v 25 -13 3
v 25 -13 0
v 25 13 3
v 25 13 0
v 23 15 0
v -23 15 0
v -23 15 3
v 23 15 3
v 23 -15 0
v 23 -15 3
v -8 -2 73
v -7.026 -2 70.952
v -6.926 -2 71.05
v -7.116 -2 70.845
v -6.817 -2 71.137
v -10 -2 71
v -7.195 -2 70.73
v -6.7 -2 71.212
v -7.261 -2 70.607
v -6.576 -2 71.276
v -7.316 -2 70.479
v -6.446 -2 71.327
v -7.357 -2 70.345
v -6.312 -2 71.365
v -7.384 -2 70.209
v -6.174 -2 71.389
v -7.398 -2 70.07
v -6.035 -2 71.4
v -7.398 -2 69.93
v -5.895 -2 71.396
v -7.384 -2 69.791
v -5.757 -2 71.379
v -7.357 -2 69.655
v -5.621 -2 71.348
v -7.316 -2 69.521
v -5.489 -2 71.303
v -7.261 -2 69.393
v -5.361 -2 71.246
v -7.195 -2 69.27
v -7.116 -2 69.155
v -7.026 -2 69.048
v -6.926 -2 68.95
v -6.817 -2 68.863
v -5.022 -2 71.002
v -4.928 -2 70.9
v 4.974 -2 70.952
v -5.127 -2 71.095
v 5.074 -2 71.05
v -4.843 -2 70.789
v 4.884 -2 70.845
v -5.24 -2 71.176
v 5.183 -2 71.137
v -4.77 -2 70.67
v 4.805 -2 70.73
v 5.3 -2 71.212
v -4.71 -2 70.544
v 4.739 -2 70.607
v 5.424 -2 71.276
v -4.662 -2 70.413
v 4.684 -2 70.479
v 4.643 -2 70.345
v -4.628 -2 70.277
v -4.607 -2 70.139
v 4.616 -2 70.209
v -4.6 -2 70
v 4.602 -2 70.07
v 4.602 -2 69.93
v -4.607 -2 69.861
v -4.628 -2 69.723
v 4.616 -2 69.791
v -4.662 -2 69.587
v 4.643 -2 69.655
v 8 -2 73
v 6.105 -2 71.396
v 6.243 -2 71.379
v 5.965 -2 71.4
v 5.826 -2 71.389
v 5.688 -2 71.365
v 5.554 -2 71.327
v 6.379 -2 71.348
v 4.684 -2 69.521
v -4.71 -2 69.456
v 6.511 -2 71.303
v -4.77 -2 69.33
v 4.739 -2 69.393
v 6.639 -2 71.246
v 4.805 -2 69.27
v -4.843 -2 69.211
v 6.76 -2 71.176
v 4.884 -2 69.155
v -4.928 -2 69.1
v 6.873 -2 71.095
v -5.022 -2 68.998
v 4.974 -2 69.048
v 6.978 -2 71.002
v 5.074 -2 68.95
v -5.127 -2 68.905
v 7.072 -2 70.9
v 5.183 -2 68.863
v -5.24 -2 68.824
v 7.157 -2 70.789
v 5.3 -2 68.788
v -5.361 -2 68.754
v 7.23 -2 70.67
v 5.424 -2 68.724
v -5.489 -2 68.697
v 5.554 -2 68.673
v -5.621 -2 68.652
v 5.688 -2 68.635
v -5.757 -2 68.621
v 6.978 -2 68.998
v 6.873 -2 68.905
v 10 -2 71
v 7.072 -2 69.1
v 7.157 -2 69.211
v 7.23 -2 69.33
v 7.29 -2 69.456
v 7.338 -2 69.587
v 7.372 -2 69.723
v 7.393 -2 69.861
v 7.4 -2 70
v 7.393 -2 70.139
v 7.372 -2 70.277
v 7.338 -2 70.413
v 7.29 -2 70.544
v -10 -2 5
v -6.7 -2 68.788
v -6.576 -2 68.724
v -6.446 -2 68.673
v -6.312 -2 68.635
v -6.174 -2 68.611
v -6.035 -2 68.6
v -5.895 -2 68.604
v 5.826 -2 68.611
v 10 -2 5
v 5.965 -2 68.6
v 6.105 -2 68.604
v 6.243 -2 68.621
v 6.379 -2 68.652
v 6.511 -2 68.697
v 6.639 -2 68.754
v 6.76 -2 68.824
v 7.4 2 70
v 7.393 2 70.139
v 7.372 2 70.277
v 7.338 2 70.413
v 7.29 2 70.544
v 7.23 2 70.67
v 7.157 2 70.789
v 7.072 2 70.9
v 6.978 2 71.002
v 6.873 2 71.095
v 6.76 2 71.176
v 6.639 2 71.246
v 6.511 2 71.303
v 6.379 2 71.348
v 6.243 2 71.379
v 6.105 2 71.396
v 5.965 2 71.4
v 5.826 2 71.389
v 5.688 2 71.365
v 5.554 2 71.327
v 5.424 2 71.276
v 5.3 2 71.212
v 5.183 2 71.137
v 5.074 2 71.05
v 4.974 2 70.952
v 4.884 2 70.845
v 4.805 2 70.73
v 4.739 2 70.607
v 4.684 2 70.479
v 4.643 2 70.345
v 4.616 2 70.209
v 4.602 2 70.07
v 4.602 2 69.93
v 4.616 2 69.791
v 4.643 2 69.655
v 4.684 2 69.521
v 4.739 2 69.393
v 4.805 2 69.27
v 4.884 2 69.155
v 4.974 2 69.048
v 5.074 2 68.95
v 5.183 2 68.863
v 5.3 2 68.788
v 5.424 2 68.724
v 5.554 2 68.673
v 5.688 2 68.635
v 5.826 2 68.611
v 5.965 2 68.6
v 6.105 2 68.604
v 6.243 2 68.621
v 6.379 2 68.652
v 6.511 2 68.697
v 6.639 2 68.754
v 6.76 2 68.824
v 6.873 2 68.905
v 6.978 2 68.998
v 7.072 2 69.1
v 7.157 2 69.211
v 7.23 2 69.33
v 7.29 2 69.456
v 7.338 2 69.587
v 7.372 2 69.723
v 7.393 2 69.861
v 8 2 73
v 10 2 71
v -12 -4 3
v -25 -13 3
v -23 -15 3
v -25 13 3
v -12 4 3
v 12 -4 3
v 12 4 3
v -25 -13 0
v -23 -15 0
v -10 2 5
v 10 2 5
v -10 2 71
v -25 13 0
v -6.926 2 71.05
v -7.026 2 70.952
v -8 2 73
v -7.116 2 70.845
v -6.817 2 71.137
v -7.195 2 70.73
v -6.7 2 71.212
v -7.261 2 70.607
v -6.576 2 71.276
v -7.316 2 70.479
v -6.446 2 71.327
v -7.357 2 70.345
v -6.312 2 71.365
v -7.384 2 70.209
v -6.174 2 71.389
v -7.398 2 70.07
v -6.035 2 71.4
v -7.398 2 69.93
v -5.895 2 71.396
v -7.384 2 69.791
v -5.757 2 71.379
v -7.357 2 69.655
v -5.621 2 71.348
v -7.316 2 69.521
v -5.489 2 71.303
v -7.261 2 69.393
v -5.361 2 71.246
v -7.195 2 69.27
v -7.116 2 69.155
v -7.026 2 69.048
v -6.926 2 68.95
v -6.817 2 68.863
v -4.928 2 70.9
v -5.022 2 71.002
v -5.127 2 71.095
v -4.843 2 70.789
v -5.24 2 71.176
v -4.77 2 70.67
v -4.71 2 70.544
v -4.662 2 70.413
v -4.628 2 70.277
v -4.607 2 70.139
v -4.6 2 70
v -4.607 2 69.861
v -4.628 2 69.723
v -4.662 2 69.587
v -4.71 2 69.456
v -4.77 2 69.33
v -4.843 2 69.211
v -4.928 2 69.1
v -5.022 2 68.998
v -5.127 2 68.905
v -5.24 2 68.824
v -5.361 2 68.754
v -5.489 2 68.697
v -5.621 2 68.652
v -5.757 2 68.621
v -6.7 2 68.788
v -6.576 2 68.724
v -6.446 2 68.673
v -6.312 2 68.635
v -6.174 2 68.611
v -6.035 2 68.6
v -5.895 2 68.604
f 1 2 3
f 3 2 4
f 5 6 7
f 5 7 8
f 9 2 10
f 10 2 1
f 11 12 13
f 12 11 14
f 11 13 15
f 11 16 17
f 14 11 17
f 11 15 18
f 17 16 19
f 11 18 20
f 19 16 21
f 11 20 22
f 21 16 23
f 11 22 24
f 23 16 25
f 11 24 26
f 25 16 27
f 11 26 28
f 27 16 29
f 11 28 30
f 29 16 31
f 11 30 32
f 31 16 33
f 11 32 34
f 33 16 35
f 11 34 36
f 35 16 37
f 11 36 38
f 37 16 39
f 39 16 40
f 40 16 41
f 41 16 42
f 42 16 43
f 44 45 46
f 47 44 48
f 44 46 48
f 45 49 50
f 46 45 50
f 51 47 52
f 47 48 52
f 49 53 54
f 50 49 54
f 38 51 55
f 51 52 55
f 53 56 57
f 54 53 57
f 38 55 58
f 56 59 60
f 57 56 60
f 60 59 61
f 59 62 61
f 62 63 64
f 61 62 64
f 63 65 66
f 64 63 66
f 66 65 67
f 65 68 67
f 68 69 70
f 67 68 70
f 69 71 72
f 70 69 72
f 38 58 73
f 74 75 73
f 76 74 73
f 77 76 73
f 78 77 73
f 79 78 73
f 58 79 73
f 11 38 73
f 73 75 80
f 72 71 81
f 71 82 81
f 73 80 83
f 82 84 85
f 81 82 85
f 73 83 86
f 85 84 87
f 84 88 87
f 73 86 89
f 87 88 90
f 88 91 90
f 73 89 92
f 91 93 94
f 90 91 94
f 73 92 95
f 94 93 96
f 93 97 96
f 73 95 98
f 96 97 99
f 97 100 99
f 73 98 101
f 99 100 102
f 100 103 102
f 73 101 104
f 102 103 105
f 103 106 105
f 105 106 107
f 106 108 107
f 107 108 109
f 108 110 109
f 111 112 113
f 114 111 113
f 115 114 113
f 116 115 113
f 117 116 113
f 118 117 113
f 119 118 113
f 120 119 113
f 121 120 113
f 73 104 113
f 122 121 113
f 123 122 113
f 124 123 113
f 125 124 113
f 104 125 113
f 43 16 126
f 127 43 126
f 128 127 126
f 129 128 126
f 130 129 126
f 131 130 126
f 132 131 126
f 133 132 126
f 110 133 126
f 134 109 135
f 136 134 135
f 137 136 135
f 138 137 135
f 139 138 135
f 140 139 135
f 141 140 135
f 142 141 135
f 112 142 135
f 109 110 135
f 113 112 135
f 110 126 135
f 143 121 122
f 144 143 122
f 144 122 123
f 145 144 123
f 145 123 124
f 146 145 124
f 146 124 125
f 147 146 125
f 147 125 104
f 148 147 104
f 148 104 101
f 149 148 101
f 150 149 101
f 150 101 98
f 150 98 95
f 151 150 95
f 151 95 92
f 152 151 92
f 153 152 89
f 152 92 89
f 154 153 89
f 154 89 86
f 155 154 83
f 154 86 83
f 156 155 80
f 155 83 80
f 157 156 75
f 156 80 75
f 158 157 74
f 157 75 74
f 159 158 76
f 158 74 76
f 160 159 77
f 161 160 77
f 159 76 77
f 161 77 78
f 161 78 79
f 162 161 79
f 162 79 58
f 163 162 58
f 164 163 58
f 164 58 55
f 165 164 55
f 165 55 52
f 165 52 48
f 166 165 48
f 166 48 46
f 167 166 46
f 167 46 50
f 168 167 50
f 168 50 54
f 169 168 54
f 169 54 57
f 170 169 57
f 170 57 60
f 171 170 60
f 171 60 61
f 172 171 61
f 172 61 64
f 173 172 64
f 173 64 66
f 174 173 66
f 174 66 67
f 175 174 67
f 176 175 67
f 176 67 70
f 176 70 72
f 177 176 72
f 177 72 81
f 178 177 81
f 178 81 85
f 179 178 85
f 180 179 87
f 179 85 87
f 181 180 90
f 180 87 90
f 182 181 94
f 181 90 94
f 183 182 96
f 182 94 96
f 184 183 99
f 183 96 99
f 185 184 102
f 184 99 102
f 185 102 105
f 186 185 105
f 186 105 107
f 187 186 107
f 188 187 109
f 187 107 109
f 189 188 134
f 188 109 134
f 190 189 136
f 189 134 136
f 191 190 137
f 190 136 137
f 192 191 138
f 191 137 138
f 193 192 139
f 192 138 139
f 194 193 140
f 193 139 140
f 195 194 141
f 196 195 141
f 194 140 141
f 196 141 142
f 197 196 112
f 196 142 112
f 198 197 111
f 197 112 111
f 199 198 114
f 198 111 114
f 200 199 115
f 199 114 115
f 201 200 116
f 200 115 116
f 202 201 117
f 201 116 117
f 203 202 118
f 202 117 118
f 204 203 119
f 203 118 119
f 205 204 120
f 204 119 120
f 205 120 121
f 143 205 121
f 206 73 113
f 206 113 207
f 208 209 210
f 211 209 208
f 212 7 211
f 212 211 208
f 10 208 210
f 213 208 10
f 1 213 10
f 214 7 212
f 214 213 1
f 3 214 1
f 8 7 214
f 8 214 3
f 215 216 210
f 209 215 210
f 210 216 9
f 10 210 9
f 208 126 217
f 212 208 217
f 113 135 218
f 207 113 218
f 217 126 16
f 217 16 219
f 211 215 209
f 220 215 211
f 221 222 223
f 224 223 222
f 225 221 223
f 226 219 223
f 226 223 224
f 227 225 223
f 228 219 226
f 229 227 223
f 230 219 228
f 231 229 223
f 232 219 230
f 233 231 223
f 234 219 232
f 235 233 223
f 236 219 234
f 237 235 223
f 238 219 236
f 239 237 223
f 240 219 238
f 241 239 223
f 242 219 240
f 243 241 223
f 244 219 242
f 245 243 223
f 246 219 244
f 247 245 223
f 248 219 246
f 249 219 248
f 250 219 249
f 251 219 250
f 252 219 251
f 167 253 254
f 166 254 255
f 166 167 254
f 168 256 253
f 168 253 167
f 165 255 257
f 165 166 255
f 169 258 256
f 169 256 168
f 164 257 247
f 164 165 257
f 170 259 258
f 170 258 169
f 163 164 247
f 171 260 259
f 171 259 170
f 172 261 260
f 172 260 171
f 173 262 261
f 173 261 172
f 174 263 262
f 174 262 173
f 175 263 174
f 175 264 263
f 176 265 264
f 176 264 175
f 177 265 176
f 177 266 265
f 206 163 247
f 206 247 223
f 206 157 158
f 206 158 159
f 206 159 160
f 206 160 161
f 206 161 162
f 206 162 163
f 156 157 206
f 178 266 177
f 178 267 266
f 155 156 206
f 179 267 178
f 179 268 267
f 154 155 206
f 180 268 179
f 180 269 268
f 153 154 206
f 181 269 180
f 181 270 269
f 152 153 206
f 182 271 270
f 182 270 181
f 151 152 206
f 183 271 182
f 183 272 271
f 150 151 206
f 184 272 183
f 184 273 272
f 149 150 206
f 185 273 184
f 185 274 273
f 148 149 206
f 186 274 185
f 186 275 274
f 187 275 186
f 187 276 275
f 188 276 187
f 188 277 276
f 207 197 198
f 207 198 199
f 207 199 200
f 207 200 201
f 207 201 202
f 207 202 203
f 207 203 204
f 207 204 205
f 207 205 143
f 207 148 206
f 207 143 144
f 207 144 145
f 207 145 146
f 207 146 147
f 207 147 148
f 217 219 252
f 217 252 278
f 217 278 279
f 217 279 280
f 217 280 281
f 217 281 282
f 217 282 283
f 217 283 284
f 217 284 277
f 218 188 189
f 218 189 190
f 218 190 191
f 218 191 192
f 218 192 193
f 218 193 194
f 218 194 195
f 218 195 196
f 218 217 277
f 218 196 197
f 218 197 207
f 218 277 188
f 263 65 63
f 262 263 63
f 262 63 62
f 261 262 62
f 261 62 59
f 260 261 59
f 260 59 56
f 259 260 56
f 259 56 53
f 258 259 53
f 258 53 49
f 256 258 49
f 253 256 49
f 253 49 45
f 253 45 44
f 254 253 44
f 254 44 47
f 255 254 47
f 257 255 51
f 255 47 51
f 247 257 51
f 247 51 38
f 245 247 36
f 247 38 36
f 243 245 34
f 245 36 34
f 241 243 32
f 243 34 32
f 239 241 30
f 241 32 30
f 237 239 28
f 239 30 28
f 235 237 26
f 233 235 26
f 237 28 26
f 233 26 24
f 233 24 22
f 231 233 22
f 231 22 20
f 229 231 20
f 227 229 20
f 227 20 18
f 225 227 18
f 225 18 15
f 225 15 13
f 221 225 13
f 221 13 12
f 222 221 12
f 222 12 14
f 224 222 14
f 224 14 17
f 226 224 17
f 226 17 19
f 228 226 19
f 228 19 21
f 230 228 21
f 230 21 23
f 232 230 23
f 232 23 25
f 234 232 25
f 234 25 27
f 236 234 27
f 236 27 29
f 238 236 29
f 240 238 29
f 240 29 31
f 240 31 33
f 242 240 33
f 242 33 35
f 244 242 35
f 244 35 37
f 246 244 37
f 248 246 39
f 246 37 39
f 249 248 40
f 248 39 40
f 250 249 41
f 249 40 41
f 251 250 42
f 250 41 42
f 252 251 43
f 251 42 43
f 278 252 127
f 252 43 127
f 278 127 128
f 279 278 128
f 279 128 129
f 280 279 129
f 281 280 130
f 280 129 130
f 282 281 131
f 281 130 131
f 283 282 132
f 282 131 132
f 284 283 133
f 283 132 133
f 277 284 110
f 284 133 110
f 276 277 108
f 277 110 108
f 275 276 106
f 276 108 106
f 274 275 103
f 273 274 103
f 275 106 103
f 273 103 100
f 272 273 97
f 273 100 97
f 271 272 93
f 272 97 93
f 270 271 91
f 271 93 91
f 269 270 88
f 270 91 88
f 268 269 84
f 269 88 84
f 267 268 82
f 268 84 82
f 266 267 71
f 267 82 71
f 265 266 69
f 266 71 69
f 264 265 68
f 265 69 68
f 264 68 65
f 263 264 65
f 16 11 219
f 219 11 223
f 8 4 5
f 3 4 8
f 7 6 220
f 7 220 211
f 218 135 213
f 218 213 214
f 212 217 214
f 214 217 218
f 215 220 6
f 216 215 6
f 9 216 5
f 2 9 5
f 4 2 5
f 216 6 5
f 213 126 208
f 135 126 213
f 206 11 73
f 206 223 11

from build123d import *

# Parameters (mm, degrees)
SKETCH_W        = 50
SKETCH_H        = 30
PAD_DEPTH       = 3
SKETCH001_W     = 20
SKETCH001_H     = 4
PAD001_DEPTH    = 70
SKETCH002_R     = 1.4
POCKET_DEPTH    = 5
CHAMFER_SIZE    = 2
CHAMFER001_SIZE = 2
CHAMFER002_SIZE = 2


with BuildPart() as part:
    # Sketch → Pad (new body)
    with BuildSketch(Plane.XY):
        Rectangle(SKETCH_W, SKETCH_H)
    extrude(amount=PAD_DEPTH)

    # Sketch001 (on Face6 of Pad) → Pad001 (join)
    with BuildSketch(Plane.XY.offset(3)):
        Rectangle(SKETCH001_W, SKETCH001_H)
    extrude(amount=PAD001_DEPTH)

    # Sketch002 (on Face9 of Pad001) → Pocket (cut)
    with BuildSketch(Plane.XZ.offset(2)):
        with Locations((-6, 70)):
            Circle(SKETCH002_R)
        with Locations((6, 70)):
            Circle(SKETCH002_R)
    extrude(amount=-POCKET_DEPTH, mode=Mode.SUBTRACT)

    # Chamfer
    chamfer_edges = [part.edges().sort_by_distance(p)[0] for p in [
        (10, 0, 3),
        (0, -2, 3),
        (0, 2, 3),
        (-10, 0, 3),
    ]]
    chamfer(chamfer_edges, length=CHAMFER_SIZE)

    # Chamfer001
    chamfer001_edges = [part.edges().sort_by_distance(p)[0] for p in [
        (-25, -15, 1.5),
        (-25, 15, 1.5),
        (25, -15, 1.5),
        (25, 15, 1.5),
    ]]
    chamfer(chamfer001_edges, length=CHAMFER001_SIZE)

    # Chamfer002
    chamfer002_edges = [part.edges().sort_by_distance(p)[0] for p in [
        (10, 0, 73),
        (-10, 0, 73),
    ]]
    chamfer(chamfer002_edges, length=CHAMFER002_SIZE)


solid = part.part
